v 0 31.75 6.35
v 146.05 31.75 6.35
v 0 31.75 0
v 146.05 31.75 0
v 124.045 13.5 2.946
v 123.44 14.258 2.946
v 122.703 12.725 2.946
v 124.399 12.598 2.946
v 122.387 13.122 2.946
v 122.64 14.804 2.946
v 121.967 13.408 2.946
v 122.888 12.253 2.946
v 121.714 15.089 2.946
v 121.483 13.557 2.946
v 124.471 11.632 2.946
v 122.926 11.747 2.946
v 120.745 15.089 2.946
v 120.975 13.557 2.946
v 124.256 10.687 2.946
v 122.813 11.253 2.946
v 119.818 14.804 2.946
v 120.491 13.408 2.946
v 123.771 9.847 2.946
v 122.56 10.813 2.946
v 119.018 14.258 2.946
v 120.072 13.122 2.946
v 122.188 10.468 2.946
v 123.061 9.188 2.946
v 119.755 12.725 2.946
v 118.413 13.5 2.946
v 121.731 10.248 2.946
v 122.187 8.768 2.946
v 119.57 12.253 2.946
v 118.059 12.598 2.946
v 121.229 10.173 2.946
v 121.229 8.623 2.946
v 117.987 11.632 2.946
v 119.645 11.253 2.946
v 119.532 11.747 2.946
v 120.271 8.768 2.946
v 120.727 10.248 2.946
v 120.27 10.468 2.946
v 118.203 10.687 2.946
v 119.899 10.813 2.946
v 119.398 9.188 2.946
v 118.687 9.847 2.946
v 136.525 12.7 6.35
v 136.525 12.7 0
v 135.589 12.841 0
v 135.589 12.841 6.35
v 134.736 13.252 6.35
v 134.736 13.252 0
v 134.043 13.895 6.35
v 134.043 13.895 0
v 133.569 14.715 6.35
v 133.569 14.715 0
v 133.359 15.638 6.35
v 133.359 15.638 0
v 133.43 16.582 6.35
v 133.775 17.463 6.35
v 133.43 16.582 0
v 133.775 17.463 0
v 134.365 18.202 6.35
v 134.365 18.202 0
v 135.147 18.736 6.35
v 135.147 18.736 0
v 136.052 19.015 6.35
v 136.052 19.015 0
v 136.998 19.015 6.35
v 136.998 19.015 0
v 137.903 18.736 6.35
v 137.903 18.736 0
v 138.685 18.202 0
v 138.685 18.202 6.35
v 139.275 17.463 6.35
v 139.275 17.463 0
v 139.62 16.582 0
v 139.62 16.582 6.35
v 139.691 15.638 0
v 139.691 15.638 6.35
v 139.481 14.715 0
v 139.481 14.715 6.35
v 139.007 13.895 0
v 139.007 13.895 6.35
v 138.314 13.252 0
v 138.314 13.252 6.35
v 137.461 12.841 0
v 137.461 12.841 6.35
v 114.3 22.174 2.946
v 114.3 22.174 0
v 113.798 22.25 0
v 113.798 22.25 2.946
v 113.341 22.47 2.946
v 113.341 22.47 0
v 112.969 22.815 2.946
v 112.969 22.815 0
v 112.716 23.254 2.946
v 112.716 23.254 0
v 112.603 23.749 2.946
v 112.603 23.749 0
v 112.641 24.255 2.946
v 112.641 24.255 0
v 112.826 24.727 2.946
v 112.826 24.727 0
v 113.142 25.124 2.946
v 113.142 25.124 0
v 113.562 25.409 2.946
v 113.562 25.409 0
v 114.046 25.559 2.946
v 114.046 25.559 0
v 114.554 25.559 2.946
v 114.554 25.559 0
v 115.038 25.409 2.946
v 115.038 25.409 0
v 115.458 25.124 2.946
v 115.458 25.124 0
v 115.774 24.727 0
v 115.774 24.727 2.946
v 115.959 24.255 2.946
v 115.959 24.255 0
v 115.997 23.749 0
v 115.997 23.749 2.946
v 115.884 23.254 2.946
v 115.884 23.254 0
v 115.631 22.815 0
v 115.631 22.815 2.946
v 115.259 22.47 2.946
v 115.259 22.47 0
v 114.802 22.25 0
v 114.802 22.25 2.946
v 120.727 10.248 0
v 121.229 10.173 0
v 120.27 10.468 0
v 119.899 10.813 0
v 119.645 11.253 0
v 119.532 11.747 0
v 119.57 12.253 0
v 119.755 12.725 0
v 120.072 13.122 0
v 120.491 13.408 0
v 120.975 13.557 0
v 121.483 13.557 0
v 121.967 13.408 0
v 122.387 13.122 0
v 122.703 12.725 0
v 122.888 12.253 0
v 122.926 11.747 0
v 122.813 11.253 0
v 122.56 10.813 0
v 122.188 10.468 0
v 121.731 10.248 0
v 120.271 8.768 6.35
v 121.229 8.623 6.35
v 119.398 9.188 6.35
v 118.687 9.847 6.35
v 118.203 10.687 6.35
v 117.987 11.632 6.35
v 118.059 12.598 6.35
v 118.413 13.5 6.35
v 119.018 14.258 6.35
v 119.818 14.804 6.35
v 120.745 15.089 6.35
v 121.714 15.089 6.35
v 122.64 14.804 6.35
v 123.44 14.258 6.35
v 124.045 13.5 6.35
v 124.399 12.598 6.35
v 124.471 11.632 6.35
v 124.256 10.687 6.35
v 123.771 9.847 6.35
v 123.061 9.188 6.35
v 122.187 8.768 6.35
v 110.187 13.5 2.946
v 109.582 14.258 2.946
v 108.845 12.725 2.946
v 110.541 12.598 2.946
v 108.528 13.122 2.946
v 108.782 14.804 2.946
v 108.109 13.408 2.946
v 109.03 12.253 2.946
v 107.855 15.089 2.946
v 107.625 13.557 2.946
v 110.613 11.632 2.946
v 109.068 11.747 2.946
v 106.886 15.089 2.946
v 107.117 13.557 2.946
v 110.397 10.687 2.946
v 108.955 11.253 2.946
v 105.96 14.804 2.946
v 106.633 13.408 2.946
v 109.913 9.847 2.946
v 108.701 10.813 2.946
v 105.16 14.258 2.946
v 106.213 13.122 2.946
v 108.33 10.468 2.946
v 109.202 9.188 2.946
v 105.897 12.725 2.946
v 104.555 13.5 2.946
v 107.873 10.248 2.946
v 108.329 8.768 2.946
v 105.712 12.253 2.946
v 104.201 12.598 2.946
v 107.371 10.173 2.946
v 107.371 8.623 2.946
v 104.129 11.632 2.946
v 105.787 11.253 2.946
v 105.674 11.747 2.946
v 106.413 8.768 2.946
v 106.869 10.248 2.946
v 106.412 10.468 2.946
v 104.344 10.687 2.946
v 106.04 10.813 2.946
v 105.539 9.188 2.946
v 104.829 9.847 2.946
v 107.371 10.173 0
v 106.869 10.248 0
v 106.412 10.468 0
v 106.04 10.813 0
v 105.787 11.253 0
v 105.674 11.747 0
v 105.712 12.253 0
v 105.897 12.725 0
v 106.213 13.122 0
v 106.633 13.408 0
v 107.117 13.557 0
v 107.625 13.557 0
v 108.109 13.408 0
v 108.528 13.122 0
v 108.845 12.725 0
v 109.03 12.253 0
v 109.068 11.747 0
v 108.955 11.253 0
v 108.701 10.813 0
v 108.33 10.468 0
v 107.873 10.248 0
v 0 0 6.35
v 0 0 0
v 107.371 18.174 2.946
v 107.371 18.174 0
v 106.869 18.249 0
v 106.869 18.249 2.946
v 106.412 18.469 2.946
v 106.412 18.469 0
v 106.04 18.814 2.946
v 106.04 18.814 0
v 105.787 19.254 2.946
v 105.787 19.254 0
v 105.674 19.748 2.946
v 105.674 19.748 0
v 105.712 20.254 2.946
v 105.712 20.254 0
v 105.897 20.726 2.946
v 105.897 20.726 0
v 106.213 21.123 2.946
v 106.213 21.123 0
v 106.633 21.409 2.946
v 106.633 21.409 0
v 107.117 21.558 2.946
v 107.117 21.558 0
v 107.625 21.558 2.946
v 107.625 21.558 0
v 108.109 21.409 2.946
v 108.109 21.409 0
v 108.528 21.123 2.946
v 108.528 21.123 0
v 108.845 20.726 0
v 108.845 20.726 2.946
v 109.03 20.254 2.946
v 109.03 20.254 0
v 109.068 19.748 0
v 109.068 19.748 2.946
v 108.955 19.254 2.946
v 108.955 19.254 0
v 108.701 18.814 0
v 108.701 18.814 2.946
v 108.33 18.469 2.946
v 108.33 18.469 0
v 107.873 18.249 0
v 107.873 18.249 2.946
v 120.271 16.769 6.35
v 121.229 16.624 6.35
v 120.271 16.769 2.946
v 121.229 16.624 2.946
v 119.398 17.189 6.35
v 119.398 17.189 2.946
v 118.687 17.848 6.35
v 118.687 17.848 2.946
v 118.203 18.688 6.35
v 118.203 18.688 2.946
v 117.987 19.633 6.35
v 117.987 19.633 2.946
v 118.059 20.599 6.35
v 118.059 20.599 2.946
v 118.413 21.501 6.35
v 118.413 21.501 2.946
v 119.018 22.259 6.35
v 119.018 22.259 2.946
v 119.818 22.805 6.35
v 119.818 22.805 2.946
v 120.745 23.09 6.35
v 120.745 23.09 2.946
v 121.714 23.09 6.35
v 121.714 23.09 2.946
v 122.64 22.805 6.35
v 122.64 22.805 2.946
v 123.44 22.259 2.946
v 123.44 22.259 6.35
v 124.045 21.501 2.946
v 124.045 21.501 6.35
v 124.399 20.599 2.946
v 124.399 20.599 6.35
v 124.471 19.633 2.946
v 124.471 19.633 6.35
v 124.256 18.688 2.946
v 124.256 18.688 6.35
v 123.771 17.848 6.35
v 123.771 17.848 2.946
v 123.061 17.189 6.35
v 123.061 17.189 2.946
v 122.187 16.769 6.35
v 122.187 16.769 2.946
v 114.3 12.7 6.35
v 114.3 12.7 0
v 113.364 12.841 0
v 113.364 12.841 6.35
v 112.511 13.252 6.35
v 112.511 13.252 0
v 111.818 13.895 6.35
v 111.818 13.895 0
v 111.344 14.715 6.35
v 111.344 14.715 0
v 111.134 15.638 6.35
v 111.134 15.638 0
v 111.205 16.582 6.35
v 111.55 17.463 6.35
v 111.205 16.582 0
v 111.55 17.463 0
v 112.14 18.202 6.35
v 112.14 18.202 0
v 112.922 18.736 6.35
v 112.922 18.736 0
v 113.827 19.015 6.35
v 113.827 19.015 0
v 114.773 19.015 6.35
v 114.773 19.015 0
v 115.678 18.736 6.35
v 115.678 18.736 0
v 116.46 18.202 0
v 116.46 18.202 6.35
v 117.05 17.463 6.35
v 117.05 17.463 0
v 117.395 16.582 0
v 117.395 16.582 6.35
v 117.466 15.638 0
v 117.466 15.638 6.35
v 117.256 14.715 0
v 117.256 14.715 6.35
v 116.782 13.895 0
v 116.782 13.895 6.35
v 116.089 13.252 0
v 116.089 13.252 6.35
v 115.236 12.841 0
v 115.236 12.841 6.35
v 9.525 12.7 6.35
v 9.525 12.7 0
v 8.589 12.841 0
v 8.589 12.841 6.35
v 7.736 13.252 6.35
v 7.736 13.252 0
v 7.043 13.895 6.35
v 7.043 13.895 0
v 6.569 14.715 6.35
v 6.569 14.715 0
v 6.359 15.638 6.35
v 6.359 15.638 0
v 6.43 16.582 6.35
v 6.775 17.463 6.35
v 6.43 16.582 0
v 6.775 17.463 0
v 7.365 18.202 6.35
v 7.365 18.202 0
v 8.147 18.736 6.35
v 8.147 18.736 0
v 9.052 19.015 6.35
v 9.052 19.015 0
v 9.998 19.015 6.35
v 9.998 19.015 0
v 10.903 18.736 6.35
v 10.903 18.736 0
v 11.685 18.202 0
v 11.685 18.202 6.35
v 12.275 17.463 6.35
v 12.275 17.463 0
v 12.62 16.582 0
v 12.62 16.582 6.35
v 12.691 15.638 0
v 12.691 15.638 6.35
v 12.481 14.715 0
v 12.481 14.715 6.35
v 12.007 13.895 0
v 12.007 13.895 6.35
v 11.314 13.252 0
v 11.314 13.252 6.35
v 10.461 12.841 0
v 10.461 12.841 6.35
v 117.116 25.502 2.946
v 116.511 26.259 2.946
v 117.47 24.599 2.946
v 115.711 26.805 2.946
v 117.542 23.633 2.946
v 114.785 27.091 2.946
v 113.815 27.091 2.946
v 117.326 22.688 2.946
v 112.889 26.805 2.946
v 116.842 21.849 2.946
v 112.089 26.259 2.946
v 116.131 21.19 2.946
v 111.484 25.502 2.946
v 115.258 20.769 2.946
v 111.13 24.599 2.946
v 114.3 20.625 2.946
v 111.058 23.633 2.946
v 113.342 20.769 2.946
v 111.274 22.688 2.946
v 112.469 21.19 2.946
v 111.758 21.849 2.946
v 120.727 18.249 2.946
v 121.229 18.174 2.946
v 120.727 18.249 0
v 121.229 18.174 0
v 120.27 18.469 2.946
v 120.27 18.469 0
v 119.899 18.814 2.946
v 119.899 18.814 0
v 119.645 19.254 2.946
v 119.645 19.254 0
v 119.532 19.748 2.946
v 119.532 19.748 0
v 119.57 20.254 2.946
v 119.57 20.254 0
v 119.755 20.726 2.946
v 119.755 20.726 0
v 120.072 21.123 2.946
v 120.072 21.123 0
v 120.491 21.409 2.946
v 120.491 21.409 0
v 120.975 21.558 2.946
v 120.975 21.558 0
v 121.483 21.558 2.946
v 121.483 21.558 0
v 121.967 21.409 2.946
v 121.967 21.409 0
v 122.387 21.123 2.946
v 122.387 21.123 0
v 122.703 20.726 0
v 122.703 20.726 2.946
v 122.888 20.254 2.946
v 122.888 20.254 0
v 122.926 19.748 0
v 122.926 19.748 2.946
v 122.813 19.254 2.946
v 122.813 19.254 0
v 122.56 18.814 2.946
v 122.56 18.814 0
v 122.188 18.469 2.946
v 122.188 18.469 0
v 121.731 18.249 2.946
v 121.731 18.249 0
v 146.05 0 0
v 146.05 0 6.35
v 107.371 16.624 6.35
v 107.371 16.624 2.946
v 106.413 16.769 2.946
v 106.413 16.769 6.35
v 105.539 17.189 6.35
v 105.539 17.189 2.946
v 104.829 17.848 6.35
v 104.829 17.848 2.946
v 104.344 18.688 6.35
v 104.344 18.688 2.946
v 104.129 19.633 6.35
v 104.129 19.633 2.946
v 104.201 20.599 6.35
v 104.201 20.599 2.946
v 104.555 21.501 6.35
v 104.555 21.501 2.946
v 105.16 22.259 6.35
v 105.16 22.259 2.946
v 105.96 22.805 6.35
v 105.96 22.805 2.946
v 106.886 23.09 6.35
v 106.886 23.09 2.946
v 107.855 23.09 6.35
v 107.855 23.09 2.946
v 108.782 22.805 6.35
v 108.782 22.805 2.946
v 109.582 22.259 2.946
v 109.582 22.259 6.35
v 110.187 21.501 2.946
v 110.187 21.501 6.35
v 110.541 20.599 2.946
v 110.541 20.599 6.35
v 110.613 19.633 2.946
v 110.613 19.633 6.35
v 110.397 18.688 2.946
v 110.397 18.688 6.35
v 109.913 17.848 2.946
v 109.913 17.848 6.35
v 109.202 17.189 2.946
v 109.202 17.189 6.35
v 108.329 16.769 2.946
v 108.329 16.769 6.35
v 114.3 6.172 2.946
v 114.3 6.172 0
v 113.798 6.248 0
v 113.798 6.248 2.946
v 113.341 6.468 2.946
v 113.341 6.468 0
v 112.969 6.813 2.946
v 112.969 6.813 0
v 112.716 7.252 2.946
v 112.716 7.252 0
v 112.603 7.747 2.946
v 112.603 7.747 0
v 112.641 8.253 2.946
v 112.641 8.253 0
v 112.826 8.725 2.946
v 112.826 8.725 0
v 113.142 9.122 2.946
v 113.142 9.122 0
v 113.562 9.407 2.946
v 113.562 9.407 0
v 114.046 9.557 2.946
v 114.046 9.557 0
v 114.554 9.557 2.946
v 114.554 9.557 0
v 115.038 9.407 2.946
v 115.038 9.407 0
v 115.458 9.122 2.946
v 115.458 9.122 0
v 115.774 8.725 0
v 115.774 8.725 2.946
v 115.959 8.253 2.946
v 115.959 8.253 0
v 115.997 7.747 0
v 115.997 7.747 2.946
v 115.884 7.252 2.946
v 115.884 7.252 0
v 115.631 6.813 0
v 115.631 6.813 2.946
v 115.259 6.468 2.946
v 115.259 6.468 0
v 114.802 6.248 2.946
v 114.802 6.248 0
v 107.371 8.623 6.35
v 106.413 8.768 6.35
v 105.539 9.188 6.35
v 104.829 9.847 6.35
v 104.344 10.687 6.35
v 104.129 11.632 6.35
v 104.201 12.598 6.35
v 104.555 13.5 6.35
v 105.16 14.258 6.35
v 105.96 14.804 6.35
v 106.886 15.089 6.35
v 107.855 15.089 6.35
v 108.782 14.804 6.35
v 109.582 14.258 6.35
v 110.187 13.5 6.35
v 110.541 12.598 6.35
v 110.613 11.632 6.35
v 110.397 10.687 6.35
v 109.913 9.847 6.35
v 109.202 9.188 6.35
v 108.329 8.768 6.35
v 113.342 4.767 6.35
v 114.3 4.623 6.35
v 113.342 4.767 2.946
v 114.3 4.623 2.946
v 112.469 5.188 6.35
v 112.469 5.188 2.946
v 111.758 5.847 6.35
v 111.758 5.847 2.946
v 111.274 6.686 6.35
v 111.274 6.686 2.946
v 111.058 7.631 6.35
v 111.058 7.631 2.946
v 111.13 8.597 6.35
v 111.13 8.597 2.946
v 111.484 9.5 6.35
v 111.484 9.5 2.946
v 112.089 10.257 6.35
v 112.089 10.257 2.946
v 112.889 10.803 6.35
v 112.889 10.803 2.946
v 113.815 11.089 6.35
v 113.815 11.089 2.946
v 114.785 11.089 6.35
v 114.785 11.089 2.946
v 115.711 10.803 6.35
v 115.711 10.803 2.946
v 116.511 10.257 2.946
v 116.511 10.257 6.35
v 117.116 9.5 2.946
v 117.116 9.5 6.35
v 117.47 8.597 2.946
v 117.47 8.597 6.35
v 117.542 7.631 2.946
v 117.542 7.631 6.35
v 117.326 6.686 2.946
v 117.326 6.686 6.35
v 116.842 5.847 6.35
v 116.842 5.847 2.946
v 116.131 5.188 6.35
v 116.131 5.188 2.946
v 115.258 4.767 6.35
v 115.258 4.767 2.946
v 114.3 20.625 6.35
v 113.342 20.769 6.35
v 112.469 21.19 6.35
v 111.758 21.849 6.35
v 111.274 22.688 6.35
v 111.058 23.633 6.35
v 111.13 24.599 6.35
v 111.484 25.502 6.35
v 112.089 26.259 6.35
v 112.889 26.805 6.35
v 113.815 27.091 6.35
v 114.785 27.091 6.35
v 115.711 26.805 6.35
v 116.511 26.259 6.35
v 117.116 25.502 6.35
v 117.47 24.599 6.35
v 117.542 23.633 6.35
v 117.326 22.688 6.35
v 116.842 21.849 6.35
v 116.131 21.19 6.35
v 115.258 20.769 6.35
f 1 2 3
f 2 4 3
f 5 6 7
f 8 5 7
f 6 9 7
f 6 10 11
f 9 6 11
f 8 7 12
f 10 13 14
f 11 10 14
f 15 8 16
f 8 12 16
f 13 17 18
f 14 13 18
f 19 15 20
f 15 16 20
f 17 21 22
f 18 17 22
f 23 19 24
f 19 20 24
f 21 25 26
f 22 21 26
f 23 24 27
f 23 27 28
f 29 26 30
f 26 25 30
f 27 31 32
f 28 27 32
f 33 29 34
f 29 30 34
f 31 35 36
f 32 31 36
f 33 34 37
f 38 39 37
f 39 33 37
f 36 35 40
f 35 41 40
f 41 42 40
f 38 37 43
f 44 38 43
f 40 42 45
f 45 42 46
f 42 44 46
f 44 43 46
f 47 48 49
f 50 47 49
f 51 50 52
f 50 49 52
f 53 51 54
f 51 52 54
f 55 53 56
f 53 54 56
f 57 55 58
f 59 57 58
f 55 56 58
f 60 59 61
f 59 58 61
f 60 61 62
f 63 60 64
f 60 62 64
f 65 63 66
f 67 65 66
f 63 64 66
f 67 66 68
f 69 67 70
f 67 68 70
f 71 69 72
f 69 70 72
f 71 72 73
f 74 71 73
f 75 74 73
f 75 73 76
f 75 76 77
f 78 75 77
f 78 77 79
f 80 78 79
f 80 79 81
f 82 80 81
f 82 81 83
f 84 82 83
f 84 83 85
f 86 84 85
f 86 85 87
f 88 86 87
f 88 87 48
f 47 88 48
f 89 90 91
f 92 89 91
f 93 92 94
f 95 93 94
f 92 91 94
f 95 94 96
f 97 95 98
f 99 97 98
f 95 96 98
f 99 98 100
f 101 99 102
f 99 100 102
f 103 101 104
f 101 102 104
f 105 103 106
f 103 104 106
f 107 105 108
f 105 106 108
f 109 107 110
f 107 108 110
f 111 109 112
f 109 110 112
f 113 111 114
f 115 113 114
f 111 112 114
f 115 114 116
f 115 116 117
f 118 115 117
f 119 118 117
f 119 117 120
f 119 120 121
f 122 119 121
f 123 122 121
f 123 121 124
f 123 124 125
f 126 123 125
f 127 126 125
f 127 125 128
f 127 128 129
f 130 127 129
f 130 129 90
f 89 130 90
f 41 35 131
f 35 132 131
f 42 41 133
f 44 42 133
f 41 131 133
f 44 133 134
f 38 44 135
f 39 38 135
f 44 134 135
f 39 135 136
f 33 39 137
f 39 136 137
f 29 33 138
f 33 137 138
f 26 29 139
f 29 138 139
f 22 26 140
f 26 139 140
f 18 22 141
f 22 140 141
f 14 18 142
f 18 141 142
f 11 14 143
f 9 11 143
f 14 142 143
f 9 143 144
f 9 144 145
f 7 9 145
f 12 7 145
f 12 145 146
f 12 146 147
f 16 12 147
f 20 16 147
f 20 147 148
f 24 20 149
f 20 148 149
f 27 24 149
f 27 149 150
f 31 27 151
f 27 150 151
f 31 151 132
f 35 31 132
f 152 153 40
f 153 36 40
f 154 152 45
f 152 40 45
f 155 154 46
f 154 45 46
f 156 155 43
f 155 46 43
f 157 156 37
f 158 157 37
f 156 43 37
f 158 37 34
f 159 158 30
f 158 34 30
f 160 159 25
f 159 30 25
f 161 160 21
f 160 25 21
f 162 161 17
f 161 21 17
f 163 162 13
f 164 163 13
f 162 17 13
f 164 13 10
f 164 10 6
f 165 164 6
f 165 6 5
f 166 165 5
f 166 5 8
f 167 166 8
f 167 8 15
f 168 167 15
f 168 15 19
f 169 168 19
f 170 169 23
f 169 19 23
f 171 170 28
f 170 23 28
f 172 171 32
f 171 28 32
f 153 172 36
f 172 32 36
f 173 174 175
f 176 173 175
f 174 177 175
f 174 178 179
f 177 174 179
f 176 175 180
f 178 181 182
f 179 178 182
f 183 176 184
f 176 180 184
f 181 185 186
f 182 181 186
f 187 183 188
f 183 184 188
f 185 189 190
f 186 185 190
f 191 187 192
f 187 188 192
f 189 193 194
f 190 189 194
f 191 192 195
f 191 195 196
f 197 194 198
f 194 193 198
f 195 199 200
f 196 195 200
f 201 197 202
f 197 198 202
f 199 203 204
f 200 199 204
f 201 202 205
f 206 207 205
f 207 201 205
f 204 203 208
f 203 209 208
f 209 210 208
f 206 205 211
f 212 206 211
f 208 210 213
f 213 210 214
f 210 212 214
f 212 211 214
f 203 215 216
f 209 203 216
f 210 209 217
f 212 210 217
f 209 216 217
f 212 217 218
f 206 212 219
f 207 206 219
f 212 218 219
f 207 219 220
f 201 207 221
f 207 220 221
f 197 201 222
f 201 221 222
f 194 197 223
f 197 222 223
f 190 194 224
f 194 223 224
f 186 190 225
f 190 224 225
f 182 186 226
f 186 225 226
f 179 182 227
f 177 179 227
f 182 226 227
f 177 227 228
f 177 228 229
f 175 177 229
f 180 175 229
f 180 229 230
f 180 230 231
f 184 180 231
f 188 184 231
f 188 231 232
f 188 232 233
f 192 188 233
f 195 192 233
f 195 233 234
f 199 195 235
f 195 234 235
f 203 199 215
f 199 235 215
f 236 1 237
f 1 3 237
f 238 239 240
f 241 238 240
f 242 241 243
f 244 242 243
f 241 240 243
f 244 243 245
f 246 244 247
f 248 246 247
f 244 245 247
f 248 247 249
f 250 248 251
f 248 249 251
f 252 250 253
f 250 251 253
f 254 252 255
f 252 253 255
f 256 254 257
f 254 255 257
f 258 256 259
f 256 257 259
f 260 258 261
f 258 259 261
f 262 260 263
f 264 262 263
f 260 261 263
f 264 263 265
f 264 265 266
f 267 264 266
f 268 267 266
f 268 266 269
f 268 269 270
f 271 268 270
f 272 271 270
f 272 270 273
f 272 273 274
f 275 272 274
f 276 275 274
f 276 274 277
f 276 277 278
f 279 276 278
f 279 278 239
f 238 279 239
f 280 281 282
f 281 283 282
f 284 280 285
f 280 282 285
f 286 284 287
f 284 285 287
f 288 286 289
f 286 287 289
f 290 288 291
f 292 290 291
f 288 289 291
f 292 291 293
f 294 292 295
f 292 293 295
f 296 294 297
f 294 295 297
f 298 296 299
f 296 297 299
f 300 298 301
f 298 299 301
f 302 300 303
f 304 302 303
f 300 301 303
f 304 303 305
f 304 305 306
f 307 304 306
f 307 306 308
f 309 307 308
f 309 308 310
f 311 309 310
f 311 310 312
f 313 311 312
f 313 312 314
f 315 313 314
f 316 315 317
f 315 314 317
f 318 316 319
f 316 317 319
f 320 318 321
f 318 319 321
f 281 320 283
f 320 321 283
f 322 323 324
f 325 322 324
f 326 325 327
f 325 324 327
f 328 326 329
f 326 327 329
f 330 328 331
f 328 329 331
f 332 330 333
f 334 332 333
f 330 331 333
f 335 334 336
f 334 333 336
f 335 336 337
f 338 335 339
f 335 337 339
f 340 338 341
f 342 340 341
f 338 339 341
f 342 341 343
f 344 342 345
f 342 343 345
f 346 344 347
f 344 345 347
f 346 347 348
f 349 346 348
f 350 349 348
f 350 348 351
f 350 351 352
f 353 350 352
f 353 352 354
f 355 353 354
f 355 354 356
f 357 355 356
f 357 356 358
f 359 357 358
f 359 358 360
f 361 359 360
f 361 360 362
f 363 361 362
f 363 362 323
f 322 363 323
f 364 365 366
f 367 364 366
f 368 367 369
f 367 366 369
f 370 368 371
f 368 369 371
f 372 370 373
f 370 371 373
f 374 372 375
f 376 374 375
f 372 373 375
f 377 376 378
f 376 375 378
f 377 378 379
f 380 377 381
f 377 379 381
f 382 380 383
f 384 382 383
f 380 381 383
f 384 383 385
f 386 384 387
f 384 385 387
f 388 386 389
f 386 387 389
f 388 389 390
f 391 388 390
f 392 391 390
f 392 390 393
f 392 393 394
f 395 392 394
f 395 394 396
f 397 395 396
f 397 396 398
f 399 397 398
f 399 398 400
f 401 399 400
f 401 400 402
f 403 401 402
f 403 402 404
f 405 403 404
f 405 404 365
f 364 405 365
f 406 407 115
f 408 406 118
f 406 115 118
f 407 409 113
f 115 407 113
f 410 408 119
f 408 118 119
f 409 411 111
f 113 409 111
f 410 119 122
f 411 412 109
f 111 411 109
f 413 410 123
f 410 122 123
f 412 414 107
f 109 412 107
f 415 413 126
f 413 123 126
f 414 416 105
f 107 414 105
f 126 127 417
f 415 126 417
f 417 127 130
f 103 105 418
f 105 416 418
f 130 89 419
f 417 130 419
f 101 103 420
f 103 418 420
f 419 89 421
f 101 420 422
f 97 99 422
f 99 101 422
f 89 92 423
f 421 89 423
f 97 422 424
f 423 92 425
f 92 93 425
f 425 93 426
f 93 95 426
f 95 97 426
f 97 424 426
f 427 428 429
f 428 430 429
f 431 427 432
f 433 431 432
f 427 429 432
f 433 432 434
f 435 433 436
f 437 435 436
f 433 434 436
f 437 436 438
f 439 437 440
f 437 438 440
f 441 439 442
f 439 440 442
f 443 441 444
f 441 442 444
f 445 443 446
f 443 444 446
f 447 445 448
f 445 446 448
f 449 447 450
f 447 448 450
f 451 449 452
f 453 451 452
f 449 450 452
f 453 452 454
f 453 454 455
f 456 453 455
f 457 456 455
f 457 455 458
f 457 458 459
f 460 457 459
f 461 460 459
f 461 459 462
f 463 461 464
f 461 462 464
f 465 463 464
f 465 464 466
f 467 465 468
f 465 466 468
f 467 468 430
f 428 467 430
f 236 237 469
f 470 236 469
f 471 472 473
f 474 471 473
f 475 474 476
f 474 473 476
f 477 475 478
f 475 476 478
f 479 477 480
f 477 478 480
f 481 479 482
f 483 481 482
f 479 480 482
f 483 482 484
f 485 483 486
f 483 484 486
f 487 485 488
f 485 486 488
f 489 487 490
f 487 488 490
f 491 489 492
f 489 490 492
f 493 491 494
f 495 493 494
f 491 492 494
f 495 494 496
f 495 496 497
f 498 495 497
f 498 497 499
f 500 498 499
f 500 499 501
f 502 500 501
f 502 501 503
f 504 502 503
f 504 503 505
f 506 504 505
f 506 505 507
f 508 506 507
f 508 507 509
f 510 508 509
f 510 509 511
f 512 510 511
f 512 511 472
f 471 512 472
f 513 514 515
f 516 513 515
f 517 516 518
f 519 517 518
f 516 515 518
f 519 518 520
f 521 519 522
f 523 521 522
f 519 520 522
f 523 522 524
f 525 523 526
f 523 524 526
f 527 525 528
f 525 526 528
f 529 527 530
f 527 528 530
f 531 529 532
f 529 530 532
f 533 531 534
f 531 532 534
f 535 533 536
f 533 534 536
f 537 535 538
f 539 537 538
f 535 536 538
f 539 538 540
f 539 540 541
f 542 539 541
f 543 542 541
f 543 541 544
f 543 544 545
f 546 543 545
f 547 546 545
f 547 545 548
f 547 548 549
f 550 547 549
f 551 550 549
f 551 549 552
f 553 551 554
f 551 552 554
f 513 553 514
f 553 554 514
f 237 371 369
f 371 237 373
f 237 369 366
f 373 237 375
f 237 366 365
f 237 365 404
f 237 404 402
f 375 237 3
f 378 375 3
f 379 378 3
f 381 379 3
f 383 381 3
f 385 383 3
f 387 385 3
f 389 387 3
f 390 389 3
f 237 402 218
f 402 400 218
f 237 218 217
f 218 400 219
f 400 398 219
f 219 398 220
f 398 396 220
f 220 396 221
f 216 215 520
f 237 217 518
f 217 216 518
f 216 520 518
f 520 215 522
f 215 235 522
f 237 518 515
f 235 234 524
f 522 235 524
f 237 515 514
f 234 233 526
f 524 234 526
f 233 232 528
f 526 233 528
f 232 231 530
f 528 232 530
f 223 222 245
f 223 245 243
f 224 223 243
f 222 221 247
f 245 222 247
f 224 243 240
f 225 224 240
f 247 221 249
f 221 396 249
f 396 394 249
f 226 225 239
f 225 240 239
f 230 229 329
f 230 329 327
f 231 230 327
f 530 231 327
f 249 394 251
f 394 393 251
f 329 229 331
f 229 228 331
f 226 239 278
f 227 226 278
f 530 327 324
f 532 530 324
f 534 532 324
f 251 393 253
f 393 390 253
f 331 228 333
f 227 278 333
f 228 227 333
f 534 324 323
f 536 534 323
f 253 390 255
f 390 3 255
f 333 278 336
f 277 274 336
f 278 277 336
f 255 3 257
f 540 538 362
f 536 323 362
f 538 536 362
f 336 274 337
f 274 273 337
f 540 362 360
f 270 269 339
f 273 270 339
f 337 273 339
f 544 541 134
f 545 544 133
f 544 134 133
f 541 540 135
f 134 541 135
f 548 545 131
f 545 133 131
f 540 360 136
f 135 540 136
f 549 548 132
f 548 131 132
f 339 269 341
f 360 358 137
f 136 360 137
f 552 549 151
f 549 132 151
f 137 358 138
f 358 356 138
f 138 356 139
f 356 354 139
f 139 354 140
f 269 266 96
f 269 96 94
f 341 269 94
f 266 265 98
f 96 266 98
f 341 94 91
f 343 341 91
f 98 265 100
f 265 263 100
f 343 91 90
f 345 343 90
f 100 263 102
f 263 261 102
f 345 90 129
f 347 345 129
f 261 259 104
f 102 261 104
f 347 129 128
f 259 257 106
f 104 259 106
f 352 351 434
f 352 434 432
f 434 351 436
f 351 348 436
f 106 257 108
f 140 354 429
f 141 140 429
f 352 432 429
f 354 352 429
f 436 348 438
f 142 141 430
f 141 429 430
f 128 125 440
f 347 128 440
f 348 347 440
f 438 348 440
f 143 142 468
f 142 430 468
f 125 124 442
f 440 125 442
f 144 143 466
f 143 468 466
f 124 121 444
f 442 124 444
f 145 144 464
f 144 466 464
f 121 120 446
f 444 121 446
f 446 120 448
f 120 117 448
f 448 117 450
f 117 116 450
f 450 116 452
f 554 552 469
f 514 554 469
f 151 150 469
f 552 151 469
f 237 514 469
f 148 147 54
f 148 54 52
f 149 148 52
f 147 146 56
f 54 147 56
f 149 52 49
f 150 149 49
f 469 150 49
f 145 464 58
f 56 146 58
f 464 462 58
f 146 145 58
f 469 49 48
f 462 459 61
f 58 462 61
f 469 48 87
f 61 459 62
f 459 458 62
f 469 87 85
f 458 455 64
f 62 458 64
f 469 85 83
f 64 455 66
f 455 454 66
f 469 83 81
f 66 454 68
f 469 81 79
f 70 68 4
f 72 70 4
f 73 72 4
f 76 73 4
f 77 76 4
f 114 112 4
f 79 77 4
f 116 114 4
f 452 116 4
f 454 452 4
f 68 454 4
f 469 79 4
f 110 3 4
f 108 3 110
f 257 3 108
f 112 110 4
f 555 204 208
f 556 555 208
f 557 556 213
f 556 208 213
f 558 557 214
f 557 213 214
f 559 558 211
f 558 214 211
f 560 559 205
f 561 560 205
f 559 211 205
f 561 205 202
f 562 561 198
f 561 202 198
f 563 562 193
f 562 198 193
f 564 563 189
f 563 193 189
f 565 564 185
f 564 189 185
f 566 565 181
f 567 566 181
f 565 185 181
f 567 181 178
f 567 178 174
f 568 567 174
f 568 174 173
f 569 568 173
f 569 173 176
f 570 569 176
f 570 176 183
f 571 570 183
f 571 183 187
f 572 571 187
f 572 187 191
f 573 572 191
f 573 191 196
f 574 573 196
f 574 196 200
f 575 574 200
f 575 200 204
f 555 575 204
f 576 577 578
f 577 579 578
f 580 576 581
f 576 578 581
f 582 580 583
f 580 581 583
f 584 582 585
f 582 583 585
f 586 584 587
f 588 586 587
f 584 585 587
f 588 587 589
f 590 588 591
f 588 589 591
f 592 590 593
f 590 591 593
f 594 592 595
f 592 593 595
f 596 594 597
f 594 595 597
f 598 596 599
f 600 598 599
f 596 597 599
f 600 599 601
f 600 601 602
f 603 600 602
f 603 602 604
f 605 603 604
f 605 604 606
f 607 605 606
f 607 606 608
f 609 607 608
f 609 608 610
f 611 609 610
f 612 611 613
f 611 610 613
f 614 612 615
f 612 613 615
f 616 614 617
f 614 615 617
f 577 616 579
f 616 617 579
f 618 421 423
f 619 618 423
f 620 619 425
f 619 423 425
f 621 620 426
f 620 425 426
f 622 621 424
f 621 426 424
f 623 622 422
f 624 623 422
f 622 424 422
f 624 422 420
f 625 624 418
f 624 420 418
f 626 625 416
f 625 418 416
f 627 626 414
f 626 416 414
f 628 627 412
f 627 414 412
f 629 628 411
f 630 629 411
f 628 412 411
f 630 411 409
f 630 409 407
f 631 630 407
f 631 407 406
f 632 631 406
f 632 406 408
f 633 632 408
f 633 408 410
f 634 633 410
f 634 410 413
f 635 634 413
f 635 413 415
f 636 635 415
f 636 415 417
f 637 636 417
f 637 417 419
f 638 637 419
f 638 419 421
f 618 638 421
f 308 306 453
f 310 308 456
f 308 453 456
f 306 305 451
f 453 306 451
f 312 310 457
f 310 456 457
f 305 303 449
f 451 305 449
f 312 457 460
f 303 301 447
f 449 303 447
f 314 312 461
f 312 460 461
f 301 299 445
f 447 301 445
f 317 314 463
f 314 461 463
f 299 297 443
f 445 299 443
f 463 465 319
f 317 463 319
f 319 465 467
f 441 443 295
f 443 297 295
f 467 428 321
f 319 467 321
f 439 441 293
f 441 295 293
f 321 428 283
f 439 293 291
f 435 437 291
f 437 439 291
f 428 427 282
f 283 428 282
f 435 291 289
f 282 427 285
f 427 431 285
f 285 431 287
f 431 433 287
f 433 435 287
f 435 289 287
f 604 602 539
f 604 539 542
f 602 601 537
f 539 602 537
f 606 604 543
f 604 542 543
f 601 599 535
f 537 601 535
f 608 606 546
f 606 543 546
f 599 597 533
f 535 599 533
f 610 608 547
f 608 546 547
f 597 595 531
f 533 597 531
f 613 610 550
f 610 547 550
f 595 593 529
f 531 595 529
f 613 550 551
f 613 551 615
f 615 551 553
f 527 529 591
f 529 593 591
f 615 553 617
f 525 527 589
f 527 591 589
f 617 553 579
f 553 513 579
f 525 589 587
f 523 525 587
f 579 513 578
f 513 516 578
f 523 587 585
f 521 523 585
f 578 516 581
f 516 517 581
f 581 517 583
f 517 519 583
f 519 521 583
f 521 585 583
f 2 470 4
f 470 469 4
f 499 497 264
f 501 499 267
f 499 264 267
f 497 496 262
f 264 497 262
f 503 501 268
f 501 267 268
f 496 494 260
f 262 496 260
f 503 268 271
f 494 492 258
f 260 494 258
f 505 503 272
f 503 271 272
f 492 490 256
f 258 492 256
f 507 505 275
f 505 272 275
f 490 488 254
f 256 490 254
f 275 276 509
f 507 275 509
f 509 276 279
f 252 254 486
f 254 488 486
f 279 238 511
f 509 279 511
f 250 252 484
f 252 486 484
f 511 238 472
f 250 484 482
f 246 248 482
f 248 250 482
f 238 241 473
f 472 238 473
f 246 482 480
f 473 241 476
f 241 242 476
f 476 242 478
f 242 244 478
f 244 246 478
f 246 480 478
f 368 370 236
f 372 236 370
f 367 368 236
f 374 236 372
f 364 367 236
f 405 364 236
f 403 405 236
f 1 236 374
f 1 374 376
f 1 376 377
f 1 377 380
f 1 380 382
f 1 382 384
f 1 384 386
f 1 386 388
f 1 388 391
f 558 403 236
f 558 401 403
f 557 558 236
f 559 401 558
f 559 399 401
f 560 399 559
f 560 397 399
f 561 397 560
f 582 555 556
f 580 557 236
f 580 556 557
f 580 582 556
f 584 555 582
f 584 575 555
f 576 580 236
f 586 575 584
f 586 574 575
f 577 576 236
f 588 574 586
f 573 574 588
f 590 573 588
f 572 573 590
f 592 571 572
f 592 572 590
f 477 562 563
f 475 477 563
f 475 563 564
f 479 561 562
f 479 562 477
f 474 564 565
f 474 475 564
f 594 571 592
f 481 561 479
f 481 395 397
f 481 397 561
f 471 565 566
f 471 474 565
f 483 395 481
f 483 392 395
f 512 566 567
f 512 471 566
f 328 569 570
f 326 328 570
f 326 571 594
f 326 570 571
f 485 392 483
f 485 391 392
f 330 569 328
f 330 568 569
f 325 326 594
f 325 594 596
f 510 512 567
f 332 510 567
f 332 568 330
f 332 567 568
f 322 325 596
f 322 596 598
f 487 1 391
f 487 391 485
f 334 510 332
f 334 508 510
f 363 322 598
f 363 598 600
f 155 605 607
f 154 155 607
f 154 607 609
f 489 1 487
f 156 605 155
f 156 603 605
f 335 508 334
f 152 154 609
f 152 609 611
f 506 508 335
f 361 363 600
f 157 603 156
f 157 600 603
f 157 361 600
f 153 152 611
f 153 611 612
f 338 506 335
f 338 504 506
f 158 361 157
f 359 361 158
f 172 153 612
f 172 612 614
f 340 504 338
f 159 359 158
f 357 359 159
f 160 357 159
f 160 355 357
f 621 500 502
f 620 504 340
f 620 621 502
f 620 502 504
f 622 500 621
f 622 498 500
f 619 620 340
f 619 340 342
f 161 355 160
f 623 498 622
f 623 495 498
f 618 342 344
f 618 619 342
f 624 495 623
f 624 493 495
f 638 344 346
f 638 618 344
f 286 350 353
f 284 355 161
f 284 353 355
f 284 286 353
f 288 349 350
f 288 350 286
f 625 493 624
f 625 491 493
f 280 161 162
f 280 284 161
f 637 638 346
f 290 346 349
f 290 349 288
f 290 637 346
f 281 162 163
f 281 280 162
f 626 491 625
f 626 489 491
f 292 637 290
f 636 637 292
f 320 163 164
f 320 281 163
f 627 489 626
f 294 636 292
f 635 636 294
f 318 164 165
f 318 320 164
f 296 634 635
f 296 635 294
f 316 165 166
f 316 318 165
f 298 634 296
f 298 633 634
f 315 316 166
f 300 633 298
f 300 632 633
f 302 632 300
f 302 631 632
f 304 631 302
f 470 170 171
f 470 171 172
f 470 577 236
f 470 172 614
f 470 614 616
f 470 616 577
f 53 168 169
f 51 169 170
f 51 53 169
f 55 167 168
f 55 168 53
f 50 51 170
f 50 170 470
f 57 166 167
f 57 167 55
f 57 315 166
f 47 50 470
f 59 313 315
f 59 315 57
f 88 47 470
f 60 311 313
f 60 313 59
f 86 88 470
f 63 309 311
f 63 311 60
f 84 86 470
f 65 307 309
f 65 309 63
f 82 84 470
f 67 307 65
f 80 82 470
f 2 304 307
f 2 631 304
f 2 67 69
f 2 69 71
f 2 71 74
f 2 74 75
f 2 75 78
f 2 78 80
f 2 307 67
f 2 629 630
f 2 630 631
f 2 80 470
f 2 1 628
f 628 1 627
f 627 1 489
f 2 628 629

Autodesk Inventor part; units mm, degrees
ref_plane "YZ Plane" through (0, 0, 0) normal (1, 0, 0) x (0, 1, 0)
ref_plane "XZ Plane" through (0, 0, 0) normal (0, 1, 0) x (-1, 0, 0)
ref_plane "XY Plane" through (0, 0, 0) normal (0, 0, 1) x (1, 0, 0)
sketch "Sketch1" plane through (0, 0, 0) normal (0, 0, 1) x (1, 0, 0)
  line L0 (0, 0) -> (146.05, 0)
  line L1 (146.05, 0) -> (146.05, 31.75)
  line L2 (146.05, 31.75) -> (0, 31.75)
  line L3 (0, 31.75) -> (0, 0)
  dimension "d0" = 146.05
  dimension "d1" = 31.75
extrude "Extrusion1" add sketch "Sketch1" along normal blind 6.35
sketch "Sketch2" plane through (0, 0, 6.35) normal (0, 0, 1) x (1, 0, 0)
  line L0 (146.05, 0) -> (146.05, 31.75) projected
  line L1 (146.05, 12.7901) -> (163.1696, 12.7901) construction
  line L2 (0, 0) -> (146.05, 0) projected
  line L3 (114.3, 0) -> (114.3, 15.875)
  line L4 (114.3, 0) -> (130.175, 0) construction
  circle A0 centre (114.3, 15.875) radius 8.001
  point P0 (114.3, 7.874)
  point P1 (121.2291, 11.8745)
  point P2 (121.2291, 19.8755)
  point P3 (114.3, 23.876)
  point P4 (107.3709, 19.8755)
  point P5 (107.3709, 11.8745)
  dimension "d9" = 16.002
  dimension "d7" = 90
  dimension "d17" = 31.75
  dimension "d48" = 360
  dimension "d79" = 31.75
  dimension "d80" = 15.875
  dimension "d81" = 15.875
hole "Hole2" at (114.3, 7.874, 6.35) at (121.2291, 11.8745, 6.35) at (121.2291, 19.8755, 6.35) at (114.3, 23.876, 6.35) at (107.3709, 19.8755, 6.35) at (107.3709, 11.8745, 6.35) direction (0, 0, -1) diameter 3.4036 end through all counterbore diameter 6.5024 counterbore depth 3.4036 clearance for "Socket Head Cap Screw ISO 4762" size "M3" standard "ISO"
hole "Hole3" at (114.3, 15.875, 6.35) direction (0, 0, -1) diameter 6.35 end through all
sketch "Sketch5" plane through (0, 0, 6.35) normal (0, 0, 1) x (1, 0, 0)
  line L0 (0, 31.75) -> (0, 0) projected
  line L1 (146.05, 31.75) -> (0, 31.75) projected
  circle A0 centre (114.3, 15.875) radius 3.175 projected
  circle A1 centre (107.3709, 19.8755) radius 3.2512 projected
  circle A2 centre (121.2291, 19.8755) radius 3.2512 projected
  circle A3 centre (114.3, 7.874) radius 3.2512 projected
  circle A4 centre (121.2291, 11.8745) radius 3.2512 projected
  circle A5 centre (114.3, 23.876) radius 3.2512 projected
  circle A6 centre (107.3709, 11.8745) radius 3.2512 projected
  line L2 (0, 0) -> (146.05, 0) projected
  line L3 (146.05, 0) -> (146.05, 31.75) projected
  line L4 (146.05, 31.75) -> (0, 31.75) projected
  line L5 (0, 31.75) -> (0, 0) projected
  point P0 (9.525, 15.875)
  point P1 (136.525, 15.875)
  dimension "d64" = 31.75
  dimension "d65" = 15.875
  dimension "d68" = 15.875
  dimension "d69" = 9.525
  dimension "d71" = 9.525
hole "Hole4" at (9.525, 15.875, 6.35) at (136.525, 15.875, 6.35) direction (0, 0, -1) diameter 6.35 end through all
equation "\"d80\" = 0.5 * d79"
equation "\"d81\" = d80"
equation "\"d65\" = 0.5 * d64"
equation "\"d68\" = d65"
equation "\"d69\" = d71"
properties part number "core hex motor to 30x30 mount"
